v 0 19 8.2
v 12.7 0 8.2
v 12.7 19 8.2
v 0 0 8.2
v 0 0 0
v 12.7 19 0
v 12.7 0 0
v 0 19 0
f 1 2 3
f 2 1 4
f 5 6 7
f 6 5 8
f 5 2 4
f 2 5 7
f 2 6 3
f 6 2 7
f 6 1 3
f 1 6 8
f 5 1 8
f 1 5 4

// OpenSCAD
$fn = 64;

segment_size = [12.7, 19, 8.2];

cube(segment_size, center=false);
